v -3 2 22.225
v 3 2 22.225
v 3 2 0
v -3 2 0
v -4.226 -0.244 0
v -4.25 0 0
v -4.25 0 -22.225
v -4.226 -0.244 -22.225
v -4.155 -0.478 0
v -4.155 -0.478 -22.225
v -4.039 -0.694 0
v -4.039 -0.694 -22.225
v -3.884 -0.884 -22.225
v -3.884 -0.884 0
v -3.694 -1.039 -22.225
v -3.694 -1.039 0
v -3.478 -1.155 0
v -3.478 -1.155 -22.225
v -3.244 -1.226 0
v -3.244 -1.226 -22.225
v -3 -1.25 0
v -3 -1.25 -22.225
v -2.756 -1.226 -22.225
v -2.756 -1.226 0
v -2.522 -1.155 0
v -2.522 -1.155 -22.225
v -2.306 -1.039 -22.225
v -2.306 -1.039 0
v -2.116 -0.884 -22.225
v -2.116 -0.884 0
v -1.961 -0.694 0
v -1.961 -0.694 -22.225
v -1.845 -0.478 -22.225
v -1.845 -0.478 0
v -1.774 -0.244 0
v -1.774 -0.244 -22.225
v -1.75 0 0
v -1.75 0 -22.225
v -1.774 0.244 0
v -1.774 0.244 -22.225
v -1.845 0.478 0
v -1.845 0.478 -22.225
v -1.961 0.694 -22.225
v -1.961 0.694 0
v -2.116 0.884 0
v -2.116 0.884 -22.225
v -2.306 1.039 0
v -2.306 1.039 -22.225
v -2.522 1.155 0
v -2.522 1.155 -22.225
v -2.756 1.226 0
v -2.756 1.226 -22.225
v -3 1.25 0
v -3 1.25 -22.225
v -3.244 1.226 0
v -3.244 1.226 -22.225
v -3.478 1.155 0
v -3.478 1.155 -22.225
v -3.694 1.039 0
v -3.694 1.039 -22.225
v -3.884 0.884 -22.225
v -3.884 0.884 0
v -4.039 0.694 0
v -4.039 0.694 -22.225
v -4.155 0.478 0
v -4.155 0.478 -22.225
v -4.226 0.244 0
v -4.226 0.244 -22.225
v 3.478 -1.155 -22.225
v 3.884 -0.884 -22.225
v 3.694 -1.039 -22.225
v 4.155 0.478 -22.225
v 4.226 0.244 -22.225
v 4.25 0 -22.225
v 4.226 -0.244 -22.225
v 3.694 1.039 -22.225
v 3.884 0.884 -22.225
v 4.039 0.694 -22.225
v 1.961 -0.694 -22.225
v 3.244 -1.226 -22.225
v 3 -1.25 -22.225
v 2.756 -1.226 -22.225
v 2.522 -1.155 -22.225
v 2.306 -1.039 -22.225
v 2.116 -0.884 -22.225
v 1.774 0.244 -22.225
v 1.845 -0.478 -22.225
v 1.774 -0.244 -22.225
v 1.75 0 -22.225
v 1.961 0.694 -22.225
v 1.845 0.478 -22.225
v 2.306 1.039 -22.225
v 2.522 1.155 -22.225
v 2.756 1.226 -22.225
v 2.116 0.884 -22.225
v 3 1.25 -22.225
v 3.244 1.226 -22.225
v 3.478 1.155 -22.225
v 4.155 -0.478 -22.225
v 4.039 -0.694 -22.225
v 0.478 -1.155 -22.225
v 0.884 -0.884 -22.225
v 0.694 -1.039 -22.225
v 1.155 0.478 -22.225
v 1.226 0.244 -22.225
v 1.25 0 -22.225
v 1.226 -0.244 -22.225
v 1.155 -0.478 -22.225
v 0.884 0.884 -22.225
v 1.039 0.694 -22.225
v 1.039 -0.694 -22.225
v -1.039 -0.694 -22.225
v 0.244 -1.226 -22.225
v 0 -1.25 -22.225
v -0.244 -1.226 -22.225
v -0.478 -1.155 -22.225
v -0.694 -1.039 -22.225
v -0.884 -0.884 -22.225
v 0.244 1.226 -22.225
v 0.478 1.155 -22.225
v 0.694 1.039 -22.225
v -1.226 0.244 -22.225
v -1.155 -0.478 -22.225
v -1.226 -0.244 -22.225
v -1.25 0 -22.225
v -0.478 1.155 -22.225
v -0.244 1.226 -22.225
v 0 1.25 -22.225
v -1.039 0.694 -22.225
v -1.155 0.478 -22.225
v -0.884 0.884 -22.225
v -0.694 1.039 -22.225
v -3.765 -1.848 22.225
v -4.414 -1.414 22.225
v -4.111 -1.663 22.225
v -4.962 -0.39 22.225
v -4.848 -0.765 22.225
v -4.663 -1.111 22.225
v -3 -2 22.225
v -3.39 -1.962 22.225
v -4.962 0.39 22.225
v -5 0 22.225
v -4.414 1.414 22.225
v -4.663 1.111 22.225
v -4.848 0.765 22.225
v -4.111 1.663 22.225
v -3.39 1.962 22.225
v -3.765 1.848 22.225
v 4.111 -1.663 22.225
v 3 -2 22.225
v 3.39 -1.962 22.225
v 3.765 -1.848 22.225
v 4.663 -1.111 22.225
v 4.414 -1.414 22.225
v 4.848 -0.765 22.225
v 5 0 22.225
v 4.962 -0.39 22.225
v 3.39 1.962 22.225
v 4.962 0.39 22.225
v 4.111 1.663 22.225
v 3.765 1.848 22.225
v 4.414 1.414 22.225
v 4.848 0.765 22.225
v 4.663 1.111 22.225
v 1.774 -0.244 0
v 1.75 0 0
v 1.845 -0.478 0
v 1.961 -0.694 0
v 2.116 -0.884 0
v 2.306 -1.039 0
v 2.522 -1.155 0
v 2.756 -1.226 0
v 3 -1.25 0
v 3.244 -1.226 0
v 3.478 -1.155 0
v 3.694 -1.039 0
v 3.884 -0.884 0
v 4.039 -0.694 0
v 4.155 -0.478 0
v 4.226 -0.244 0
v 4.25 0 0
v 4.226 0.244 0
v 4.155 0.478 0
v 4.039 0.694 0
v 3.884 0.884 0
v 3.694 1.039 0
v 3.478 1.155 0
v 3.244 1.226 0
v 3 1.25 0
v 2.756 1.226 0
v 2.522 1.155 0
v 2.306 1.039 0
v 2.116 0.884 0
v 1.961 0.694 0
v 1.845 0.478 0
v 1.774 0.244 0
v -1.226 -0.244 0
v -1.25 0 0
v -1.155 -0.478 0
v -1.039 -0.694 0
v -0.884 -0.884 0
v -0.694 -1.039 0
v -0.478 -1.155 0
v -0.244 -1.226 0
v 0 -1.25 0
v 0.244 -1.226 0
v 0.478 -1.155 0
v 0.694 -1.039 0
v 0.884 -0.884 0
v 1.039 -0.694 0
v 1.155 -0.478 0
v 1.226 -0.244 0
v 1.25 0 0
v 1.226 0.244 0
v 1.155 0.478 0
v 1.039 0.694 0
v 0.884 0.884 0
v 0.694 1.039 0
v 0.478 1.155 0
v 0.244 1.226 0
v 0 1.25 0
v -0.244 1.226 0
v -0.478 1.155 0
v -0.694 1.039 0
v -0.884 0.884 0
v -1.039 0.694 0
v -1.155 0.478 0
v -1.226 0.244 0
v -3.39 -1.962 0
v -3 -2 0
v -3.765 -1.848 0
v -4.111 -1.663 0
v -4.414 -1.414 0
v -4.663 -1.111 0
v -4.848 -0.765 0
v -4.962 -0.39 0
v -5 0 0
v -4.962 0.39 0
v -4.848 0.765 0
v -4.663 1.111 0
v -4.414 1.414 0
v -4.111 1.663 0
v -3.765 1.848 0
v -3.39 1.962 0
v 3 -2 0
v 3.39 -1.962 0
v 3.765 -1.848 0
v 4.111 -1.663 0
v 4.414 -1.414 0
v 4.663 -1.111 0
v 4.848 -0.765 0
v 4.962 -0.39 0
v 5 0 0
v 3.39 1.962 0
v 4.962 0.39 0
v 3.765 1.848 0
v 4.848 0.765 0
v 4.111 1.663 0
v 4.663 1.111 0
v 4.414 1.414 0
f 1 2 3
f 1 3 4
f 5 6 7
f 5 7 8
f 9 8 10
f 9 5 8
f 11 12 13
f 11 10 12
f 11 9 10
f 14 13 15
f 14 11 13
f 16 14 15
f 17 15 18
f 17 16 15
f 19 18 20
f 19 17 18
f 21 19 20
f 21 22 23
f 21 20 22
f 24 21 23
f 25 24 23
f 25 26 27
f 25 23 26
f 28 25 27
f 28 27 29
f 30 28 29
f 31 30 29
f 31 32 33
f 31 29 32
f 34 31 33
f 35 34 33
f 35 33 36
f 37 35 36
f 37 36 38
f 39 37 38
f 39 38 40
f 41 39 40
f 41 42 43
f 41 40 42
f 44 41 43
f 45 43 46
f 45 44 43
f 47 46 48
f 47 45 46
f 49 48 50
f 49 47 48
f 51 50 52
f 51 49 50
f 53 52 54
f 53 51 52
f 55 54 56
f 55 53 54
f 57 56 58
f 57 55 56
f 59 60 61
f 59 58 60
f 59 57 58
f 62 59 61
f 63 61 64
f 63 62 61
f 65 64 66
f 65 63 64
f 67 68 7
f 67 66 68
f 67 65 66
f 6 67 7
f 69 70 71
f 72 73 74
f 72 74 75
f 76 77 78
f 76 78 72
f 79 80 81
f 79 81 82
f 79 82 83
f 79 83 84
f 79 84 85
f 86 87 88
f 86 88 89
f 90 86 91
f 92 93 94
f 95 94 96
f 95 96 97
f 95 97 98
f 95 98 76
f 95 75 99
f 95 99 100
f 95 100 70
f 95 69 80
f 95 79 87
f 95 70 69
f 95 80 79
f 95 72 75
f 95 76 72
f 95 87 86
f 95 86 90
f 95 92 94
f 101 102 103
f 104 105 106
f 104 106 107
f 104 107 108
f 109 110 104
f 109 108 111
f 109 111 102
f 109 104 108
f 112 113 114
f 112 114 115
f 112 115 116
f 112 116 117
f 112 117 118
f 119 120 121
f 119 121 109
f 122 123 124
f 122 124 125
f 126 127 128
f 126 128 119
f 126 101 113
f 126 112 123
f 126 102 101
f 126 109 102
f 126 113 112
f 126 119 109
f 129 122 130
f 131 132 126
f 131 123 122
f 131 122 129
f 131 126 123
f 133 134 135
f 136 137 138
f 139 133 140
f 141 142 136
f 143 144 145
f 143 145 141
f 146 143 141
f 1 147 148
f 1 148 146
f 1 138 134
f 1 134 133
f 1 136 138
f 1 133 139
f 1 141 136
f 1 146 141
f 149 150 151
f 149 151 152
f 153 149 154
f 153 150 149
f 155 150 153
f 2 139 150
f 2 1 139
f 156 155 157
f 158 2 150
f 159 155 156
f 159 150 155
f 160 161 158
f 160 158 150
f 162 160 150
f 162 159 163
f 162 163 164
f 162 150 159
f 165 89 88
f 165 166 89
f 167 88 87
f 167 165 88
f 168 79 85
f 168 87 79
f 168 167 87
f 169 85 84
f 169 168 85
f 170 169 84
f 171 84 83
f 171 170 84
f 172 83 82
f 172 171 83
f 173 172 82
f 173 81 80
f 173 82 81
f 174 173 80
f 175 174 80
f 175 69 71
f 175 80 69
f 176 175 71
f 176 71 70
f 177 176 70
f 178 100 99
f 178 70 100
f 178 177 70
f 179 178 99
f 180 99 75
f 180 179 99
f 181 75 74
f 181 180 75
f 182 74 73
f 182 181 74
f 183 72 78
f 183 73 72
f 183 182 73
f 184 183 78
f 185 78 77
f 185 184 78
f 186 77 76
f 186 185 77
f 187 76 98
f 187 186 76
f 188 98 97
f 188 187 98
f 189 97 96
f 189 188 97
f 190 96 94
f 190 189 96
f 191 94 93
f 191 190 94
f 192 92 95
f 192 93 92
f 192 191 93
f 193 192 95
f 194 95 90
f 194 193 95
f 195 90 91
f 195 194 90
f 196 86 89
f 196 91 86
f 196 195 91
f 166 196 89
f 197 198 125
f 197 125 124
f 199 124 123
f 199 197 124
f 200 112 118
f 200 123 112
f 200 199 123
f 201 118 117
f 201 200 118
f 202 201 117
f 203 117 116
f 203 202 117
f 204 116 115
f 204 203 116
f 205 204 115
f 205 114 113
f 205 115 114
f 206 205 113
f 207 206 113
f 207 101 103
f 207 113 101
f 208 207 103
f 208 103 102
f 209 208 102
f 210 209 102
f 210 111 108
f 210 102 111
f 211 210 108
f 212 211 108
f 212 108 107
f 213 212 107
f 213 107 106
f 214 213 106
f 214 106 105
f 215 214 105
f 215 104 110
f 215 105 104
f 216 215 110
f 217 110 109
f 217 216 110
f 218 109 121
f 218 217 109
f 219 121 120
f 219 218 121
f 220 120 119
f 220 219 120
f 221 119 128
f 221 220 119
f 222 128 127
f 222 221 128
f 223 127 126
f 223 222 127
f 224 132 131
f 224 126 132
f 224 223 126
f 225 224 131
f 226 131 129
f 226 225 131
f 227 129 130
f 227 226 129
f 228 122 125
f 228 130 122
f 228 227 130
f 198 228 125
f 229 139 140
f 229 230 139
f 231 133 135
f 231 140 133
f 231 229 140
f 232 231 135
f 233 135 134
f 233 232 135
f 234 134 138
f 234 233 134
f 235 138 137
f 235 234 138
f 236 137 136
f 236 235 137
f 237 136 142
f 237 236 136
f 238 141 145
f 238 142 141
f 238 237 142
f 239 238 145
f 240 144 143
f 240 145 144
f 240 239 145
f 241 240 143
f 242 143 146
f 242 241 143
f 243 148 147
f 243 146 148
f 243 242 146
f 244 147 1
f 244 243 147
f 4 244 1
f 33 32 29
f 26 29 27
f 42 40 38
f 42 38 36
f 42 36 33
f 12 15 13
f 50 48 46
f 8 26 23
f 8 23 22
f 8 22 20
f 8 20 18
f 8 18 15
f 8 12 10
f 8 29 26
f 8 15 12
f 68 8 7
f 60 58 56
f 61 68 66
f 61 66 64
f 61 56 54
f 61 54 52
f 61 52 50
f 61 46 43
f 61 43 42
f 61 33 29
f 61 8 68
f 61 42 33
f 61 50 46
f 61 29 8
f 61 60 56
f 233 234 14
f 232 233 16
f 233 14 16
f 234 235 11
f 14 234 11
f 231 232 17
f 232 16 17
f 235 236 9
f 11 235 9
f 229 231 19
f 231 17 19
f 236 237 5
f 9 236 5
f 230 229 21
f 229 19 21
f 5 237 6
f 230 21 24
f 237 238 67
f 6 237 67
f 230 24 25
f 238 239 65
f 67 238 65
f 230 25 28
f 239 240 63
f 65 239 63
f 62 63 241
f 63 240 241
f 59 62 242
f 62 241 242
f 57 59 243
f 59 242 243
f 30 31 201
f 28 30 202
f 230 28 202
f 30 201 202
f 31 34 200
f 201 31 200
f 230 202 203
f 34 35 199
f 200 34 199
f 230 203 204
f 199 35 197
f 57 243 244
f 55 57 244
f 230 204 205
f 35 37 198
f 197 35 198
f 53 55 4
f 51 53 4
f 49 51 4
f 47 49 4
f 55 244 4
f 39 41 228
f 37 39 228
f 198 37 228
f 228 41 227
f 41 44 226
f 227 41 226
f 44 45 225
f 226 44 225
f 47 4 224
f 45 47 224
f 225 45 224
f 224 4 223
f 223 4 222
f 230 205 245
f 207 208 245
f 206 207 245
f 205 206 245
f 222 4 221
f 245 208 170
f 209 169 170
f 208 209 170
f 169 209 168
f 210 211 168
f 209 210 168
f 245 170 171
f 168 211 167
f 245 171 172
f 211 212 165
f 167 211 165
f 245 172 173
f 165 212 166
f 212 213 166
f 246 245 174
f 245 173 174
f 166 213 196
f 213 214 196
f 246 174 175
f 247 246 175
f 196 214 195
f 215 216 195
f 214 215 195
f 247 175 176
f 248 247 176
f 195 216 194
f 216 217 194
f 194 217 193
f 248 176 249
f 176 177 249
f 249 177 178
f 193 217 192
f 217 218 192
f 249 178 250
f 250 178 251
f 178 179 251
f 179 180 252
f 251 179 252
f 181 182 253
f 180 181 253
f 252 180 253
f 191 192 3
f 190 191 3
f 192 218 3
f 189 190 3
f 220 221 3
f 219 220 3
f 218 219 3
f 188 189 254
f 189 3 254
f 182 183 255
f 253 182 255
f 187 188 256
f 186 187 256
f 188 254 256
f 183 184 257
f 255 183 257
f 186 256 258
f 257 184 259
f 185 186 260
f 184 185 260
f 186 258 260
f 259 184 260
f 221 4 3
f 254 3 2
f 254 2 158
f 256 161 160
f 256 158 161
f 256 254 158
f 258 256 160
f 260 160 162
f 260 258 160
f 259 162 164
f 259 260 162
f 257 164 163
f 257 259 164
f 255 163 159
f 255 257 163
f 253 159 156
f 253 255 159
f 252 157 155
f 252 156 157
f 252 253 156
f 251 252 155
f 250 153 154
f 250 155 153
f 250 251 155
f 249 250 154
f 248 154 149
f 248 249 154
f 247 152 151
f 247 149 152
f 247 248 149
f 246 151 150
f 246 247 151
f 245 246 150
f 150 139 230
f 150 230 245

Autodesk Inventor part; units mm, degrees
ref_plane "YZ Plane" through (0, 0, 0) normal (1, 0, 0) x (0, 1, 0)
ref_plane "XZ Plane" through (0, 0, 0) normal (0, 1, 0) x (-1, 0, 0)
ref_plane "XY Plane" through (0, 0, 0) normal (0, 0, 1) x (1, 0, 0)
sketch "Sketch1" plane through (0, 0, 0) normal (0, 0, 1) x (1, 0, 0)
  line L0 (-3, 0) -> (3, 0) construction
  line L1 (-3, -2) -> (3, -2)
  line L2 (3, 2) -> (-3, 2)
  arc A0 (-3, 2) -> (-3, -2) centre (-3, 0) ccw
  arc A1 (3, -2) -> (3, 2) centre (3, 0) ccw
  point P0 (0, 0)
  dimension "d0" = 4
  dimension "d1" = 6
extrude "Extrusion1" add sketch "Sketch1" along normal blind 22.225
sketch "Sketch2" plane through (0, 0, 0) normal (0, 0, -1) x (-1, 0, 0)
  circle A0 centre (0, 0) radius 1.25
  circle A1 centre (-3, 0) radius 1.25
  arc A2 (-3, 2) -> (-3, -2) centre (-3, 0) ccw projected
  circle A3 centre (3, 0) radius 1.25
  dimension "d4" = 2.5
  dimension "d5" = 2.5
  dimension "d8" = 360
extrude "Extrusion2" add sketch "Sketch2" along normal blind 22.225
properties part number "SLEEVE" material "Rubber, Silicone"
